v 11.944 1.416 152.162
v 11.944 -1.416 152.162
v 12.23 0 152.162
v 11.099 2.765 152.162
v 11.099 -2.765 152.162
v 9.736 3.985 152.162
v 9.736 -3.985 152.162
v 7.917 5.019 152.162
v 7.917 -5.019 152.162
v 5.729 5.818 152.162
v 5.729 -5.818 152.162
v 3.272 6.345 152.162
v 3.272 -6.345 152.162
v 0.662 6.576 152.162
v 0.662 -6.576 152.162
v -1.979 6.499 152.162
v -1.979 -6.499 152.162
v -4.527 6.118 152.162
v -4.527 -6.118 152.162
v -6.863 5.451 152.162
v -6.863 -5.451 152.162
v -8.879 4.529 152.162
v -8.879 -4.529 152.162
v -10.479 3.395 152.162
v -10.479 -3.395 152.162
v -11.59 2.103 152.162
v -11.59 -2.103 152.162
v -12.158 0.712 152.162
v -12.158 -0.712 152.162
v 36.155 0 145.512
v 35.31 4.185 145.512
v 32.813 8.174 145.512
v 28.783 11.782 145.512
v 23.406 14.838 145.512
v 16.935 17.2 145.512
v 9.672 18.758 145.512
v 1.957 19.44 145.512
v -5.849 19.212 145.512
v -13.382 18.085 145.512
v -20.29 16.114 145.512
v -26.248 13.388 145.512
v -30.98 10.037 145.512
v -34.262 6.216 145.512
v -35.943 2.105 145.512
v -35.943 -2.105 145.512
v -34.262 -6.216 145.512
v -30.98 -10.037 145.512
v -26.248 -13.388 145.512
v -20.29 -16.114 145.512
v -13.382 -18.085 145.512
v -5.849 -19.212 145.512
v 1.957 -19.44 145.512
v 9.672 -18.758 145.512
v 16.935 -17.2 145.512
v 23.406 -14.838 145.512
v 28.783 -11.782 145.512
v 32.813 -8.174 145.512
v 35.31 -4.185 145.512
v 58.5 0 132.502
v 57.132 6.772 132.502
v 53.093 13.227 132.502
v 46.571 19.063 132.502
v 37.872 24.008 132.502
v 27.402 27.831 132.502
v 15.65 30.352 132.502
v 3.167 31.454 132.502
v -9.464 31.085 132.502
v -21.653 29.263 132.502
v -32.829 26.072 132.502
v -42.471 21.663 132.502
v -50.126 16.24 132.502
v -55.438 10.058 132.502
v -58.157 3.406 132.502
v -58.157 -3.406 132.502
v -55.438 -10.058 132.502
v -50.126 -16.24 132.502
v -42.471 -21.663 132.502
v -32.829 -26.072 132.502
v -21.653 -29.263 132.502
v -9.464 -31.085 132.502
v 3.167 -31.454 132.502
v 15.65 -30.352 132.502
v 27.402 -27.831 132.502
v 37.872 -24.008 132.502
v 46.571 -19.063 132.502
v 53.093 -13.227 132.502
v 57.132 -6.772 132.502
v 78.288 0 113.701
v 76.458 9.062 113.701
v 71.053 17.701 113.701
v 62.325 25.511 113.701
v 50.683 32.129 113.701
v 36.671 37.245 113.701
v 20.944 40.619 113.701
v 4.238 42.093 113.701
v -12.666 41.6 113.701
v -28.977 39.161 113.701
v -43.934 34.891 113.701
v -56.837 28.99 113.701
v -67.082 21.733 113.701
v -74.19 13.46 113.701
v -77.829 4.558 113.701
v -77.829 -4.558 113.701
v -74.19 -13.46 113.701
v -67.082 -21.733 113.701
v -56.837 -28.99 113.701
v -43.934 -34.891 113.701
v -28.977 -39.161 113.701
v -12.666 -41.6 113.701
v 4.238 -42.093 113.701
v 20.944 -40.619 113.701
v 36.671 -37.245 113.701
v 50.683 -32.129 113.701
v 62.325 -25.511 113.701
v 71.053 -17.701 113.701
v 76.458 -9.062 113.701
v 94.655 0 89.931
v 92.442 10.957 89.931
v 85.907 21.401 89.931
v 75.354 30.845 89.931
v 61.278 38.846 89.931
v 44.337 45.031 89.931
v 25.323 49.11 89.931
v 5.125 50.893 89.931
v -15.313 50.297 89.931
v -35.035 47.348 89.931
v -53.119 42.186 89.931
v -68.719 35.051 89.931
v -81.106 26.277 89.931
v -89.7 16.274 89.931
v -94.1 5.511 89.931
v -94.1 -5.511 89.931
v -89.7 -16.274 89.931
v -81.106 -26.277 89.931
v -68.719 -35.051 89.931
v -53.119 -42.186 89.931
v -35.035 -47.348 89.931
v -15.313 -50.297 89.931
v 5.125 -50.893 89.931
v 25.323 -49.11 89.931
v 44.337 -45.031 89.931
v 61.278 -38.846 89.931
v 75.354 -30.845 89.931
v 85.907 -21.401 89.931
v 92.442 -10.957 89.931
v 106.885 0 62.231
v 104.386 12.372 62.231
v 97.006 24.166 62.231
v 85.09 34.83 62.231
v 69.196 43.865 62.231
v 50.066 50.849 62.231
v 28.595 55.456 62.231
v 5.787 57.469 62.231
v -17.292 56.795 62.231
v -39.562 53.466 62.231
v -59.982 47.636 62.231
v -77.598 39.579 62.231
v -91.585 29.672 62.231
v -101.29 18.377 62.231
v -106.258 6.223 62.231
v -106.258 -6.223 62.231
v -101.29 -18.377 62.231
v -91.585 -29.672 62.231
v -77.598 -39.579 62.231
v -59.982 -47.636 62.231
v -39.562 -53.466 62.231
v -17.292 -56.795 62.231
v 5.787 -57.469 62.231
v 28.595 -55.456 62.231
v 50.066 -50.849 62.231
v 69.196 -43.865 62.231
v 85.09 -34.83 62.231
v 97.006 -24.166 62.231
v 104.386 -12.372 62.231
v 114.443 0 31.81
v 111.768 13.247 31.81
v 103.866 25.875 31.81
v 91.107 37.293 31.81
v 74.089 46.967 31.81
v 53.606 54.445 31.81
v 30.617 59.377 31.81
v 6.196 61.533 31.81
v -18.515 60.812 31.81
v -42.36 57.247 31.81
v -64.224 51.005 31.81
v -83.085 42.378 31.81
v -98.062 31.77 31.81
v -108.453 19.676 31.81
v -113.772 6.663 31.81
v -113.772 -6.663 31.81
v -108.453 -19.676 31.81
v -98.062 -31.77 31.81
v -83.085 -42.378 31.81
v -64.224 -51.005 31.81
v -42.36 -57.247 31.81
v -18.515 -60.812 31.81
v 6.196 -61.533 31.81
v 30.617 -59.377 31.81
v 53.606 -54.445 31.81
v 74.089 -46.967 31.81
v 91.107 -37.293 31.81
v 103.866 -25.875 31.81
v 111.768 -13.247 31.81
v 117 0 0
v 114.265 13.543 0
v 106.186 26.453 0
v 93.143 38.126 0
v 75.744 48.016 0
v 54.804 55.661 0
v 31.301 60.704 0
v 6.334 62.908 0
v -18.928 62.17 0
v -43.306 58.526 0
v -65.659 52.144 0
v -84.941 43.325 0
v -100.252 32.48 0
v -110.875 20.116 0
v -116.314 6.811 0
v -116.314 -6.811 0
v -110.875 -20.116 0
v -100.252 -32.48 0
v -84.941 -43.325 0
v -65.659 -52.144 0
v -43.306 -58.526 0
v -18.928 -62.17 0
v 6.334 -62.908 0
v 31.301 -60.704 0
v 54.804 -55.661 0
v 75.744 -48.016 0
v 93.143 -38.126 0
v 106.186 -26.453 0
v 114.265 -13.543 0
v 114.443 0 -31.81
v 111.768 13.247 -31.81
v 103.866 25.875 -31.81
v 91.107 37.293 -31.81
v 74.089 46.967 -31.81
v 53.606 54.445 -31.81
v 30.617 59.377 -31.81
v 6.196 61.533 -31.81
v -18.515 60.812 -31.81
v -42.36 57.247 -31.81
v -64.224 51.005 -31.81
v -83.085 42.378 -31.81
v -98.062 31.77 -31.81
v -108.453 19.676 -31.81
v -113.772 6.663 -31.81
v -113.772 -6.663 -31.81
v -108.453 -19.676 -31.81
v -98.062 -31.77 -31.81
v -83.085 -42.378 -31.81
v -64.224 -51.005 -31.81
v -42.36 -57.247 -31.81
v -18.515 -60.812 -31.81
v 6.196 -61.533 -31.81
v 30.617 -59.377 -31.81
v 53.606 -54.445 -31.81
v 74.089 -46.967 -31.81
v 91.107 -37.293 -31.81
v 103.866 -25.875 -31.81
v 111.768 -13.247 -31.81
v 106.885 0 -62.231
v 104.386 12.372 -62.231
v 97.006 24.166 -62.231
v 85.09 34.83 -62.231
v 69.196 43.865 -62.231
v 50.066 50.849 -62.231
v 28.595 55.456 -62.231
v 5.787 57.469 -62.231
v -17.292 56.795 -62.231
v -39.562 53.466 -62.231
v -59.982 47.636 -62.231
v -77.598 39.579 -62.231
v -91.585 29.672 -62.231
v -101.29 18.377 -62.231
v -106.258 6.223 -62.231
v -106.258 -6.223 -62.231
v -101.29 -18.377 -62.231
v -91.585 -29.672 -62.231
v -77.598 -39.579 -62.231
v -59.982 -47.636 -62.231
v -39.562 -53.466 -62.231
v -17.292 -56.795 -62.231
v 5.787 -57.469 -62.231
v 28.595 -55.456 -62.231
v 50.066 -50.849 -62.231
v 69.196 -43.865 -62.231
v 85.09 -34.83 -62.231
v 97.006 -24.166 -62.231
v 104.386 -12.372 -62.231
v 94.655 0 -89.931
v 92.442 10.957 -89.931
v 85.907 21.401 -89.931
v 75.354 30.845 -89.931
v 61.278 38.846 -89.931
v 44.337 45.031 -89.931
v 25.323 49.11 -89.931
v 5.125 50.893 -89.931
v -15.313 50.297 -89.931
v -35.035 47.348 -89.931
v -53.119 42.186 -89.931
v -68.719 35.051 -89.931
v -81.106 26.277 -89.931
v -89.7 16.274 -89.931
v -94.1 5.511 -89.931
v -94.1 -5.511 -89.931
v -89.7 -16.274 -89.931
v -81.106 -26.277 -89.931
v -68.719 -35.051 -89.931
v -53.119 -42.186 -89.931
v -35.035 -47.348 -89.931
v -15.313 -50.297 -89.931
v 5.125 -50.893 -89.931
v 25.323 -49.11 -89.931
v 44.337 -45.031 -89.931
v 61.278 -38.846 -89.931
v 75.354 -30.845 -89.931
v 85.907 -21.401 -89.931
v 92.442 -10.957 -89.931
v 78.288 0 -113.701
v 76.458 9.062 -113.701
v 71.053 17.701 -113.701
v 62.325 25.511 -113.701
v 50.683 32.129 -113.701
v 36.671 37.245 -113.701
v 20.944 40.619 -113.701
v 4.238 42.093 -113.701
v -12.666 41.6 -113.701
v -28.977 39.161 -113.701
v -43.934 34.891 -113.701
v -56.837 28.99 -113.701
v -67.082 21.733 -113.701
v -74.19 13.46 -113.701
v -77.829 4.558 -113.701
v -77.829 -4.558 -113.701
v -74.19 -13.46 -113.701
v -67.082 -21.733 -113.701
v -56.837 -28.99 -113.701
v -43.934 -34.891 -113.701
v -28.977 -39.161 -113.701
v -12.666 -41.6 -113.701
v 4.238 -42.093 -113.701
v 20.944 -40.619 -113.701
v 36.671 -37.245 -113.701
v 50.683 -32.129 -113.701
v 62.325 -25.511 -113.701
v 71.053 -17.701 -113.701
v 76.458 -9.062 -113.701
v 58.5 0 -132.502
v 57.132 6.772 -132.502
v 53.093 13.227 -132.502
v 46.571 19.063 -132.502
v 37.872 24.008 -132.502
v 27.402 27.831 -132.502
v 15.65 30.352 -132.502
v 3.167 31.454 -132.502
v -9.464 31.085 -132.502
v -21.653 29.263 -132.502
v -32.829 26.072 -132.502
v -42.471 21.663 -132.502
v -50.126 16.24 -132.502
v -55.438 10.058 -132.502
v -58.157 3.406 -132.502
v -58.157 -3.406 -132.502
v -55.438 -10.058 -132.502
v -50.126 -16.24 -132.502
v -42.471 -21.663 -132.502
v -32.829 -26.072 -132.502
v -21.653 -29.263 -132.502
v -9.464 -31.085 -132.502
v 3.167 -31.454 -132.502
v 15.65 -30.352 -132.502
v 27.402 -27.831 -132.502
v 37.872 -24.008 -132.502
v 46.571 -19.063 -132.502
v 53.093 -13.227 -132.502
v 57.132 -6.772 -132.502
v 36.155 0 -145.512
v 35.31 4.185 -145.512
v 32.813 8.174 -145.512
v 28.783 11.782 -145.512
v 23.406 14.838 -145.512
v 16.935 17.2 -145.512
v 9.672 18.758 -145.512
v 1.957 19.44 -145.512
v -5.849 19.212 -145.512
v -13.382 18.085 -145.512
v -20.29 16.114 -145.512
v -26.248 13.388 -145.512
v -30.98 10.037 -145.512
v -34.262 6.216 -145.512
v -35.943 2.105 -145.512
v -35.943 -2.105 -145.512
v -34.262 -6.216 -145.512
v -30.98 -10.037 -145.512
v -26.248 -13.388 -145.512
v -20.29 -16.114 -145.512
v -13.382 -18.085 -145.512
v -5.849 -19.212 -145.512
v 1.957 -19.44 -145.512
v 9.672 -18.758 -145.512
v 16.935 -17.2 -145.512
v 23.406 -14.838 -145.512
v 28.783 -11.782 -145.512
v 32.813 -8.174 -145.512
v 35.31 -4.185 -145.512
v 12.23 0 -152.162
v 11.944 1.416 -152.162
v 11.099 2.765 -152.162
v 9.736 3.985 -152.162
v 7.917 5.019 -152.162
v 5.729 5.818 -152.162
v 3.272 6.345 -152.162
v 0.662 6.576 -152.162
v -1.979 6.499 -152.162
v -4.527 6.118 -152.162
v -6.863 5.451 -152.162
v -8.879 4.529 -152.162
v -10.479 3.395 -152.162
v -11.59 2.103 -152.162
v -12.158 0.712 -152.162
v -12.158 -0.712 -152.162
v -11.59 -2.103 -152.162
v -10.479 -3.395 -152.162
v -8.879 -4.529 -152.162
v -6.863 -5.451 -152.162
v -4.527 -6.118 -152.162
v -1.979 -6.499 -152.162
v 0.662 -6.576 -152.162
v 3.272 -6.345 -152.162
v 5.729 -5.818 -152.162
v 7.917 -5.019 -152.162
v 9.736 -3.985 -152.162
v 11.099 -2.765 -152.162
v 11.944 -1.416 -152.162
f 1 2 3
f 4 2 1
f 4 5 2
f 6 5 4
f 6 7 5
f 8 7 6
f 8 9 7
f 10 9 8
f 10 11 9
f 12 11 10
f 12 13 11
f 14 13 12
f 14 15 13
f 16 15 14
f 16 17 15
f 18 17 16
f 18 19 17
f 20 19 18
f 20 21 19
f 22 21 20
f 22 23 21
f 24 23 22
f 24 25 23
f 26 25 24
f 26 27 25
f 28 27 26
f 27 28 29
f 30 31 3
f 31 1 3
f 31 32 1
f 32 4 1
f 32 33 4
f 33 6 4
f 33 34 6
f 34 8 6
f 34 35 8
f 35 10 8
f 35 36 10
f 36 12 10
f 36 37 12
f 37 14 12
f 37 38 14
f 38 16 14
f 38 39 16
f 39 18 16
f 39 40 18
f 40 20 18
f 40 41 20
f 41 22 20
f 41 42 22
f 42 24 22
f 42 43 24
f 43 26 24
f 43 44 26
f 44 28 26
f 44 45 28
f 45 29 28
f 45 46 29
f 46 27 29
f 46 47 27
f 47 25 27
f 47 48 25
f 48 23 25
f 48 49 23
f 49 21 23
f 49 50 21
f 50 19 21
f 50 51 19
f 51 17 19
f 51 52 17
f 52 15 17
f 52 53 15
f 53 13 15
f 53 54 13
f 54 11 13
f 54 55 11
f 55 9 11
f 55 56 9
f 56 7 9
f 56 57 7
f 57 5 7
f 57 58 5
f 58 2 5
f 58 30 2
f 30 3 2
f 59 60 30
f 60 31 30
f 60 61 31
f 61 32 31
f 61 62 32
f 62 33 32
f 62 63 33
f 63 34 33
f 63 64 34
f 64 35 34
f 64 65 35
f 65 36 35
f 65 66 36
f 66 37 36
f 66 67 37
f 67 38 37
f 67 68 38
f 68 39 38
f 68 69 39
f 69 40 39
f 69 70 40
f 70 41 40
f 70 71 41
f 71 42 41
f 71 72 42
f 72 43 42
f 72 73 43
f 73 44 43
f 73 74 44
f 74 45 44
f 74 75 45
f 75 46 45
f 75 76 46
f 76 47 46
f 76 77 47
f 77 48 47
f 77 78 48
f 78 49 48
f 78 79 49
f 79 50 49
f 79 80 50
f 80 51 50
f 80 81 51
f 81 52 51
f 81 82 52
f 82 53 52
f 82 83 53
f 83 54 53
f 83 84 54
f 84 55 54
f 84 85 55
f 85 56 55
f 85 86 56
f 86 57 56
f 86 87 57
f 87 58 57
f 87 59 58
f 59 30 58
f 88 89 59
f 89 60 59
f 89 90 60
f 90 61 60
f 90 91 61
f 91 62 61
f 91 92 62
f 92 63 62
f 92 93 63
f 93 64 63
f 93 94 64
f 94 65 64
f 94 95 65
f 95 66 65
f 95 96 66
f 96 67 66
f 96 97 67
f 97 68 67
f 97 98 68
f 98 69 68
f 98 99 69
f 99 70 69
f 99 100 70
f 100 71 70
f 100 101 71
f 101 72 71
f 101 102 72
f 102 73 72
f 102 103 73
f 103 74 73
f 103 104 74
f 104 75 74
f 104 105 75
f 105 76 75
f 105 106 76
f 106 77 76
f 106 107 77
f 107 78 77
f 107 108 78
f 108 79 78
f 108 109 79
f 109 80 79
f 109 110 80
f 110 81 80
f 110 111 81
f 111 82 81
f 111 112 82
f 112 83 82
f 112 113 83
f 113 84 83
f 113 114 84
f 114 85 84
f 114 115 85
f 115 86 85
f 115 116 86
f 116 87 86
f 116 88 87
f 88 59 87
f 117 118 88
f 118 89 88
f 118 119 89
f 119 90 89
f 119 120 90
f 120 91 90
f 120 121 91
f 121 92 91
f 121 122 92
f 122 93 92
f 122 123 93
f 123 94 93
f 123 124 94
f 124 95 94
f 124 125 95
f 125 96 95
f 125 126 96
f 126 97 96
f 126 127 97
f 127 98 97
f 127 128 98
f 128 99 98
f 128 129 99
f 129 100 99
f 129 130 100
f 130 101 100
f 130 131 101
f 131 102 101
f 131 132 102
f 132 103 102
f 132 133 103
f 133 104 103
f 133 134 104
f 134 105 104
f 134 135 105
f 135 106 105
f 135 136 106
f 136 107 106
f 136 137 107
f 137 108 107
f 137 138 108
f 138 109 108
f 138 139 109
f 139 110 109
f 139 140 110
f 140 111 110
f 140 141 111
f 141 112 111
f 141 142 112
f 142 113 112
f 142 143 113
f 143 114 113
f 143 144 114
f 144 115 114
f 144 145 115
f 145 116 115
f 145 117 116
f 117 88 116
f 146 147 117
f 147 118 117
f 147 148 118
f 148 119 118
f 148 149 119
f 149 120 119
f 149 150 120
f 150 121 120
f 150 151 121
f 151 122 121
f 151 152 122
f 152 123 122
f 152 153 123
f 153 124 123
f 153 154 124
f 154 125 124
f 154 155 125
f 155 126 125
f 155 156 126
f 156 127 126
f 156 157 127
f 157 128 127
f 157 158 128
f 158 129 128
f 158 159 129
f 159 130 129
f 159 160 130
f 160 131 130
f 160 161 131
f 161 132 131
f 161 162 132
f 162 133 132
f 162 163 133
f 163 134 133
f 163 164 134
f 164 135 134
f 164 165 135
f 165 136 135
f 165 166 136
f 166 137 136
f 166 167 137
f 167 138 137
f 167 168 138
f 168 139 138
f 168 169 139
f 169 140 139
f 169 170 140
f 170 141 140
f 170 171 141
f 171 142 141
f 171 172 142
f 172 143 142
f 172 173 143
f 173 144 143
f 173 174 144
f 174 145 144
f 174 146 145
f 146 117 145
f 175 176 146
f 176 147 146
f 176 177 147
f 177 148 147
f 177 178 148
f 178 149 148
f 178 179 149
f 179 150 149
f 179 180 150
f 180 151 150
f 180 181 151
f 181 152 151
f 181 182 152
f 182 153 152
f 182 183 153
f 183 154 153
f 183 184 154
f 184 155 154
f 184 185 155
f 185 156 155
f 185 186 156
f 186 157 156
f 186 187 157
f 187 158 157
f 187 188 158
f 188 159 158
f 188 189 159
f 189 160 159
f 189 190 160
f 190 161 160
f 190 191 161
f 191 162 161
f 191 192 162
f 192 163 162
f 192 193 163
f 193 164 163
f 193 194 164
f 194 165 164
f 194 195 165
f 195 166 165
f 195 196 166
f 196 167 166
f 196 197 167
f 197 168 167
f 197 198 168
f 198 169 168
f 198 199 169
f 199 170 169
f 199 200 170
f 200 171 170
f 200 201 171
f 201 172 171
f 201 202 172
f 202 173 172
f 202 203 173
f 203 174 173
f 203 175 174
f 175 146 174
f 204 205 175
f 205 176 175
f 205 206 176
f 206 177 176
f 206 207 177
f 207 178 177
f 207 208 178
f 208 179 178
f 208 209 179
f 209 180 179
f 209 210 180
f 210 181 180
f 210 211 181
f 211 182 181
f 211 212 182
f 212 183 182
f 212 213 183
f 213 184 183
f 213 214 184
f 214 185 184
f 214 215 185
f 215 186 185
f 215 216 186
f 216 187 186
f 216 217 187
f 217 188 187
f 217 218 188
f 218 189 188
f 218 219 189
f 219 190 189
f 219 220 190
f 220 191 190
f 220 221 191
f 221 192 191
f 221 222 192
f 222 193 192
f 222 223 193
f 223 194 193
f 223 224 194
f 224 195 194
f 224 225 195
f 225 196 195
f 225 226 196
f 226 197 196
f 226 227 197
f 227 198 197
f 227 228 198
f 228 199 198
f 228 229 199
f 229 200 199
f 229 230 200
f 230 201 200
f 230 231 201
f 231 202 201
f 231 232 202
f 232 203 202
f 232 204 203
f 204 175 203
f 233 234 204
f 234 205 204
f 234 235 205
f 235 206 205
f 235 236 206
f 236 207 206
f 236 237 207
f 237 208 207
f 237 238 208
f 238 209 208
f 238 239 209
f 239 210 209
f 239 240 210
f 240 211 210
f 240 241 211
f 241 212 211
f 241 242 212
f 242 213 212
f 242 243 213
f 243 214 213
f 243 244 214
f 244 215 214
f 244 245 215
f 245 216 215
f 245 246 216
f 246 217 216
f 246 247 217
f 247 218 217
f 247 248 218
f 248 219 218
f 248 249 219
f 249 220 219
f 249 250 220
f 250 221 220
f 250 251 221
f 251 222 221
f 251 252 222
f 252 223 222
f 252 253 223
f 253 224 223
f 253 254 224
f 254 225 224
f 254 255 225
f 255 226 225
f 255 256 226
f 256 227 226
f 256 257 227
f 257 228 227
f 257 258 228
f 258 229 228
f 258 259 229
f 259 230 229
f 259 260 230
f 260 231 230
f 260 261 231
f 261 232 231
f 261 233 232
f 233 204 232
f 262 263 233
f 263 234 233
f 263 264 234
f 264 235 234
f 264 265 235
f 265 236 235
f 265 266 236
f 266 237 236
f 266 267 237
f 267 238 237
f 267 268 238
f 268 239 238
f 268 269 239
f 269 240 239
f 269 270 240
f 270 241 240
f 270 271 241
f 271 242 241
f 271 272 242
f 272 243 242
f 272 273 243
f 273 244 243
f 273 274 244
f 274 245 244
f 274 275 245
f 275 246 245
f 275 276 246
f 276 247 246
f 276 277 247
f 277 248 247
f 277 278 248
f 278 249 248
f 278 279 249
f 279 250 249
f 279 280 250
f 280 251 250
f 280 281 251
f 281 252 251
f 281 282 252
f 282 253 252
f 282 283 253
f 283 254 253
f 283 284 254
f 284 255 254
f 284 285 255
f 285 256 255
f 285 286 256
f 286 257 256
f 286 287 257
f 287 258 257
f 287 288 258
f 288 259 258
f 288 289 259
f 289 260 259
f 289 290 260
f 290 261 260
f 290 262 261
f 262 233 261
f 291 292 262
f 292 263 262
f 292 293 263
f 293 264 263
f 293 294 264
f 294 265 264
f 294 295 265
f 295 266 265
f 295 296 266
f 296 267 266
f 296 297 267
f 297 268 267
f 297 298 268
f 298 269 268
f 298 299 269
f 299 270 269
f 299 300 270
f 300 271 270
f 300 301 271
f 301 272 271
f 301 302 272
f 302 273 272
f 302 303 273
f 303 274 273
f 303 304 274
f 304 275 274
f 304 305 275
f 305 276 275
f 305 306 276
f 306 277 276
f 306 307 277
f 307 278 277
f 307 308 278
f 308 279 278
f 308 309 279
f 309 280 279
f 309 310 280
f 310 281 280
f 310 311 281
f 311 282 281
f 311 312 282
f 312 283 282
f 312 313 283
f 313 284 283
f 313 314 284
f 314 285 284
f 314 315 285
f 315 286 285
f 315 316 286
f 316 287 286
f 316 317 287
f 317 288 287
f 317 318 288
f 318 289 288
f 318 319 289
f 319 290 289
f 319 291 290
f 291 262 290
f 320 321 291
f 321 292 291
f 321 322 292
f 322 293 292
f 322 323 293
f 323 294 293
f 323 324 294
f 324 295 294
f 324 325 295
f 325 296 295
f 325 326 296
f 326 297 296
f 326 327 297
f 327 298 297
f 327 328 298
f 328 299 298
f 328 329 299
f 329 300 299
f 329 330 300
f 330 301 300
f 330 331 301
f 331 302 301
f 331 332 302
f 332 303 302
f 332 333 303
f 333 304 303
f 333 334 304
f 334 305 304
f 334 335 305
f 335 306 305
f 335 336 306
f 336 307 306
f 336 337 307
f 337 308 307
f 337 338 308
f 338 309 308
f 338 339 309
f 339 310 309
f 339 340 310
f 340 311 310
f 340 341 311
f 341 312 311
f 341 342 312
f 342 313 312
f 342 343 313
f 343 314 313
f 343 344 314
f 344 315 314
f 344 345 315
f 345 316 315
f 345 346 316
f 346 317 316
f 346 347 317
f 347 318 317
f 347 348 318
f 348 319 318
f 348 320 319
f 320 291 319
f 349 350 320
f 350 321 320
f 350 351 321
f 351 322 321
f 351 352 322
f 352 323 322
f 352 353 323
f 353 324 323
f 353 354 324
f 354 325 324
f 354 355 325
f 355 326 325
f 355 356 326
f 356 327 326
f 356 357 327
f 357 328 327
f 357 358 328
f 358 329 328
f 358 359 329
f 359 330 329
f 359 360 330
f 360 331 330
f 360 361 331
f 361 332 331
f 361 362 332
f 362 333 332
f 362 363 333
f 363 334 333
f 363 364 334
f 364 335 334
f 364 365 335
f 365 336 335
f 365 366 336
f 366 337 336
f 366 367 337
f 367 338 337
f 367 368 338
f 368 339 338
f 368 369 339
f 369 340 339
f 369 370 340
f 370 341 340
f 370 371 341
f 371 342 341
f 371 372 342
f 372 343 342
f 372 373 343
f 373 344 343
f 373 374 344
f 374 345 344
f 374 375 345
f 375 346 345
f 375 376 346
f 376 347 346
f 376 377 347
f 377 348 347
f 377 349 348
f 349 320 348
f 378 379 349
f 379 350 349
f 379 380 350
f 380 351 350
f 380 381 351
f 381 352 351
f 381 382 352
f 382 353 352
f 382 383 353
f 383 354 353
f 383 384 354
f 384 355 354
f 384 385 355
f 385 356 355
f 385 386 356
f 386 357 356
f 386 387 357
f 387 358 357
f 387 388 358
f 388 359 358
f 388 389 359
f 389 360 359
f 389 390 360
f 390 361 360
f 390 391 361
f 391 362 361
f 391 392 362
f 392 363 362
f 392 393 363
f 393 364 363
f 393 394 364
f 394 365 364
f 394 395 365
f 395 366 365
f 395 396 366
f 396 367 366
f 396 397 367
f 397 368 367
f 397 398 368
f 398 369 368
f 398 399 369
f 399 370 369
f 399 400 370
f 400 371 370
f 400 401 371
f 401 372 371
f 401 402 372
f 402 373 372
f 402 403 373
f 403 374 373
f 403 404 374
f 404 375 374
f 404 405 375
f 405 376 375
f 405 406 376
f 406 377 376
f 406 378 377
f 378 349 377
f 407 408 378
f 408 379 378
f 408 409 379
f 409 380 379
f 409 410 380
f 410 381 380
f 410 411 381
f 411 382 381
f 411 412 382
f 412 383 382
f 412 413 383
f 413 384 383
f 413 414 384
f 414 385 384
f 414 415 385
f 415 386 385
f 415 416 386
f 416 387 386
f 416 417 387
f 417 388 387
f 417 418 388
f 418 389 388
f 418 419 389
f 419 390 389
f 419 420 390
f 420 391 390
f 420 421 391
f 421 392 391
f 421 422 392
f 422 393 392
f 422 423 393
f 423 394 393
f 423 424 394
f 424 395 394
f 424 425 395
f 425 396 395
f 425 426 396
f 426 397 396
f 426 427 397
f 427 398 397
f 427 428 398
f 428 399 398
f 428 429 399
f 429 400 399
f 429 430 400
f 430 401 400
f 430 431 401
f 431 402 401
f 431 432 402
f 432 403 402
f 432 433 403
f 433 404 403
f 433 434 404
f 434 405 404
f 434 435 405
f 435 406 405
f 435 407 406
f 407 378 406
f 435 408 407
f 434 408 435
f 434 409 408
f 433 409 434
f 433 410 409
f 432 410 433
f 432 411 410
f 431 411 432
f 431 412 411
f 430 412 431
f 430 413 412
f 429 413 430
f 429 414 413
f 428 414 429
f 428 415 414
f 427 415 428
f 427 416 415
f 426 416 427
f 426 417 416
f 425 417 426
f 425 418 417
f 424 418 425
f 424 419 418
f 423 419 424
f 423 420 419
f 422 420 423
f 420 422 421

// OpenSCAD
// Generated by SolidPython 1.0.1 on 2020-07-29 00:46:50


scale(v = [13, 7, 17]) {
	sphere(r = 9);
}
/***********************************************
*********      SolidPython code:      **********
************************************************
 
# import packages: SolidPython
from solid import *
from solid.utils import *
from itertools import chain, combinations, permutations


class Resize:

    def __init__(self, scad_file):
        self.scad_file = scad_file
        #self.scad_file = import_scad(scad_file)
        # cone/cylinder param:
        self.r1 = 0
        self.r2 = 0
        self.h = 0
        # rectangular prism param:
        self.w = 0
        self.l = 0
        # ellipse param:
        self.r = 0

    # import OpenScad code (file name corresponds to shape)


    # classify shape + parameters
    def assign(self, param1, param2, param3):
        if self.scad_file == 'cone.scad':
            self.r1 = param1
            self.r2 = param2
            self.h = param3
        elif self.scad_file == 'cylinder.scad':
            self.r1 = param1
            self.r2 = param2
            self.h = param3
        elif self.scad_file == 'rectangularPrism.scad':
            self.h = param1
            self.l = param2
            self.w = param3
        else:
            self.r = param1
            self.h = param2

    # resize parameters
    def iterate(self):
        x = range(3, 20, 2)
        i = 1
        if self.scad_file == 'cone.scad':
            tempList = list(permutations(x, 2))
            for temp in tempList:
                param1 = temp[0]
                param2 = temp[1]
                filepath = 'produced_scad_files/' + 'cone' + str(param1) + '_' + str(param2) + '_' + '.scad'
                scad_render_to_file(cylinder(h=param1, r1=param2, r2=0), filepath)

        elif self.scad_file == 'cylinder.scad':
            tempList = list(permutations(x, 3))
            for temp in tempList:
                param1 = temp[0]
                param2 = temp[1]
                filepath = 'produced_scad_files/' + 'cylinder' + str(param1) + '_' + str(param2) + '_' + '.scad'
                scad_render_to_file(cylinder(h=param1, r1=param2, r2=param2), filepath)

        elif self.scad_file == 'rectangularPrism.scad':
            tempList = list(permutations(x, 3))
            for temp in tempList:
                param1 = temp[0]
                param2 = temp[1]
                param3 = temp[2]
                filepath = 'produced_scad_files/' + 'rectangularPrism' + str(param1) + '_' + str(param2) + '_' + str(
                    param3) + '.scad'
                scad_render_to_file(cube(size=(param1, param2, param3)), filepath)

        elif self.scad_file == 'ellipse.scad':
            tempList = list(permutations(x, 4))
            for temp in tempList:
                param1 = temp[0]
                param2 = temp[1]
                param3 = temp[2]
                param4 = temp[3]
                filepath = 'produced_scad_files/' + 'ellipse' + str(param1) + '_' + str(param2) + '_' + str(param3) + '_' + str(param4) + '.scad'
                scad_render_to_file(scale([param1, param2, param3])(sphere(r=param4)), filepath)

    def render_to_scadfile(self):
        scad_render_to_file(scad, 'example.scad') 
 
************************************************/
